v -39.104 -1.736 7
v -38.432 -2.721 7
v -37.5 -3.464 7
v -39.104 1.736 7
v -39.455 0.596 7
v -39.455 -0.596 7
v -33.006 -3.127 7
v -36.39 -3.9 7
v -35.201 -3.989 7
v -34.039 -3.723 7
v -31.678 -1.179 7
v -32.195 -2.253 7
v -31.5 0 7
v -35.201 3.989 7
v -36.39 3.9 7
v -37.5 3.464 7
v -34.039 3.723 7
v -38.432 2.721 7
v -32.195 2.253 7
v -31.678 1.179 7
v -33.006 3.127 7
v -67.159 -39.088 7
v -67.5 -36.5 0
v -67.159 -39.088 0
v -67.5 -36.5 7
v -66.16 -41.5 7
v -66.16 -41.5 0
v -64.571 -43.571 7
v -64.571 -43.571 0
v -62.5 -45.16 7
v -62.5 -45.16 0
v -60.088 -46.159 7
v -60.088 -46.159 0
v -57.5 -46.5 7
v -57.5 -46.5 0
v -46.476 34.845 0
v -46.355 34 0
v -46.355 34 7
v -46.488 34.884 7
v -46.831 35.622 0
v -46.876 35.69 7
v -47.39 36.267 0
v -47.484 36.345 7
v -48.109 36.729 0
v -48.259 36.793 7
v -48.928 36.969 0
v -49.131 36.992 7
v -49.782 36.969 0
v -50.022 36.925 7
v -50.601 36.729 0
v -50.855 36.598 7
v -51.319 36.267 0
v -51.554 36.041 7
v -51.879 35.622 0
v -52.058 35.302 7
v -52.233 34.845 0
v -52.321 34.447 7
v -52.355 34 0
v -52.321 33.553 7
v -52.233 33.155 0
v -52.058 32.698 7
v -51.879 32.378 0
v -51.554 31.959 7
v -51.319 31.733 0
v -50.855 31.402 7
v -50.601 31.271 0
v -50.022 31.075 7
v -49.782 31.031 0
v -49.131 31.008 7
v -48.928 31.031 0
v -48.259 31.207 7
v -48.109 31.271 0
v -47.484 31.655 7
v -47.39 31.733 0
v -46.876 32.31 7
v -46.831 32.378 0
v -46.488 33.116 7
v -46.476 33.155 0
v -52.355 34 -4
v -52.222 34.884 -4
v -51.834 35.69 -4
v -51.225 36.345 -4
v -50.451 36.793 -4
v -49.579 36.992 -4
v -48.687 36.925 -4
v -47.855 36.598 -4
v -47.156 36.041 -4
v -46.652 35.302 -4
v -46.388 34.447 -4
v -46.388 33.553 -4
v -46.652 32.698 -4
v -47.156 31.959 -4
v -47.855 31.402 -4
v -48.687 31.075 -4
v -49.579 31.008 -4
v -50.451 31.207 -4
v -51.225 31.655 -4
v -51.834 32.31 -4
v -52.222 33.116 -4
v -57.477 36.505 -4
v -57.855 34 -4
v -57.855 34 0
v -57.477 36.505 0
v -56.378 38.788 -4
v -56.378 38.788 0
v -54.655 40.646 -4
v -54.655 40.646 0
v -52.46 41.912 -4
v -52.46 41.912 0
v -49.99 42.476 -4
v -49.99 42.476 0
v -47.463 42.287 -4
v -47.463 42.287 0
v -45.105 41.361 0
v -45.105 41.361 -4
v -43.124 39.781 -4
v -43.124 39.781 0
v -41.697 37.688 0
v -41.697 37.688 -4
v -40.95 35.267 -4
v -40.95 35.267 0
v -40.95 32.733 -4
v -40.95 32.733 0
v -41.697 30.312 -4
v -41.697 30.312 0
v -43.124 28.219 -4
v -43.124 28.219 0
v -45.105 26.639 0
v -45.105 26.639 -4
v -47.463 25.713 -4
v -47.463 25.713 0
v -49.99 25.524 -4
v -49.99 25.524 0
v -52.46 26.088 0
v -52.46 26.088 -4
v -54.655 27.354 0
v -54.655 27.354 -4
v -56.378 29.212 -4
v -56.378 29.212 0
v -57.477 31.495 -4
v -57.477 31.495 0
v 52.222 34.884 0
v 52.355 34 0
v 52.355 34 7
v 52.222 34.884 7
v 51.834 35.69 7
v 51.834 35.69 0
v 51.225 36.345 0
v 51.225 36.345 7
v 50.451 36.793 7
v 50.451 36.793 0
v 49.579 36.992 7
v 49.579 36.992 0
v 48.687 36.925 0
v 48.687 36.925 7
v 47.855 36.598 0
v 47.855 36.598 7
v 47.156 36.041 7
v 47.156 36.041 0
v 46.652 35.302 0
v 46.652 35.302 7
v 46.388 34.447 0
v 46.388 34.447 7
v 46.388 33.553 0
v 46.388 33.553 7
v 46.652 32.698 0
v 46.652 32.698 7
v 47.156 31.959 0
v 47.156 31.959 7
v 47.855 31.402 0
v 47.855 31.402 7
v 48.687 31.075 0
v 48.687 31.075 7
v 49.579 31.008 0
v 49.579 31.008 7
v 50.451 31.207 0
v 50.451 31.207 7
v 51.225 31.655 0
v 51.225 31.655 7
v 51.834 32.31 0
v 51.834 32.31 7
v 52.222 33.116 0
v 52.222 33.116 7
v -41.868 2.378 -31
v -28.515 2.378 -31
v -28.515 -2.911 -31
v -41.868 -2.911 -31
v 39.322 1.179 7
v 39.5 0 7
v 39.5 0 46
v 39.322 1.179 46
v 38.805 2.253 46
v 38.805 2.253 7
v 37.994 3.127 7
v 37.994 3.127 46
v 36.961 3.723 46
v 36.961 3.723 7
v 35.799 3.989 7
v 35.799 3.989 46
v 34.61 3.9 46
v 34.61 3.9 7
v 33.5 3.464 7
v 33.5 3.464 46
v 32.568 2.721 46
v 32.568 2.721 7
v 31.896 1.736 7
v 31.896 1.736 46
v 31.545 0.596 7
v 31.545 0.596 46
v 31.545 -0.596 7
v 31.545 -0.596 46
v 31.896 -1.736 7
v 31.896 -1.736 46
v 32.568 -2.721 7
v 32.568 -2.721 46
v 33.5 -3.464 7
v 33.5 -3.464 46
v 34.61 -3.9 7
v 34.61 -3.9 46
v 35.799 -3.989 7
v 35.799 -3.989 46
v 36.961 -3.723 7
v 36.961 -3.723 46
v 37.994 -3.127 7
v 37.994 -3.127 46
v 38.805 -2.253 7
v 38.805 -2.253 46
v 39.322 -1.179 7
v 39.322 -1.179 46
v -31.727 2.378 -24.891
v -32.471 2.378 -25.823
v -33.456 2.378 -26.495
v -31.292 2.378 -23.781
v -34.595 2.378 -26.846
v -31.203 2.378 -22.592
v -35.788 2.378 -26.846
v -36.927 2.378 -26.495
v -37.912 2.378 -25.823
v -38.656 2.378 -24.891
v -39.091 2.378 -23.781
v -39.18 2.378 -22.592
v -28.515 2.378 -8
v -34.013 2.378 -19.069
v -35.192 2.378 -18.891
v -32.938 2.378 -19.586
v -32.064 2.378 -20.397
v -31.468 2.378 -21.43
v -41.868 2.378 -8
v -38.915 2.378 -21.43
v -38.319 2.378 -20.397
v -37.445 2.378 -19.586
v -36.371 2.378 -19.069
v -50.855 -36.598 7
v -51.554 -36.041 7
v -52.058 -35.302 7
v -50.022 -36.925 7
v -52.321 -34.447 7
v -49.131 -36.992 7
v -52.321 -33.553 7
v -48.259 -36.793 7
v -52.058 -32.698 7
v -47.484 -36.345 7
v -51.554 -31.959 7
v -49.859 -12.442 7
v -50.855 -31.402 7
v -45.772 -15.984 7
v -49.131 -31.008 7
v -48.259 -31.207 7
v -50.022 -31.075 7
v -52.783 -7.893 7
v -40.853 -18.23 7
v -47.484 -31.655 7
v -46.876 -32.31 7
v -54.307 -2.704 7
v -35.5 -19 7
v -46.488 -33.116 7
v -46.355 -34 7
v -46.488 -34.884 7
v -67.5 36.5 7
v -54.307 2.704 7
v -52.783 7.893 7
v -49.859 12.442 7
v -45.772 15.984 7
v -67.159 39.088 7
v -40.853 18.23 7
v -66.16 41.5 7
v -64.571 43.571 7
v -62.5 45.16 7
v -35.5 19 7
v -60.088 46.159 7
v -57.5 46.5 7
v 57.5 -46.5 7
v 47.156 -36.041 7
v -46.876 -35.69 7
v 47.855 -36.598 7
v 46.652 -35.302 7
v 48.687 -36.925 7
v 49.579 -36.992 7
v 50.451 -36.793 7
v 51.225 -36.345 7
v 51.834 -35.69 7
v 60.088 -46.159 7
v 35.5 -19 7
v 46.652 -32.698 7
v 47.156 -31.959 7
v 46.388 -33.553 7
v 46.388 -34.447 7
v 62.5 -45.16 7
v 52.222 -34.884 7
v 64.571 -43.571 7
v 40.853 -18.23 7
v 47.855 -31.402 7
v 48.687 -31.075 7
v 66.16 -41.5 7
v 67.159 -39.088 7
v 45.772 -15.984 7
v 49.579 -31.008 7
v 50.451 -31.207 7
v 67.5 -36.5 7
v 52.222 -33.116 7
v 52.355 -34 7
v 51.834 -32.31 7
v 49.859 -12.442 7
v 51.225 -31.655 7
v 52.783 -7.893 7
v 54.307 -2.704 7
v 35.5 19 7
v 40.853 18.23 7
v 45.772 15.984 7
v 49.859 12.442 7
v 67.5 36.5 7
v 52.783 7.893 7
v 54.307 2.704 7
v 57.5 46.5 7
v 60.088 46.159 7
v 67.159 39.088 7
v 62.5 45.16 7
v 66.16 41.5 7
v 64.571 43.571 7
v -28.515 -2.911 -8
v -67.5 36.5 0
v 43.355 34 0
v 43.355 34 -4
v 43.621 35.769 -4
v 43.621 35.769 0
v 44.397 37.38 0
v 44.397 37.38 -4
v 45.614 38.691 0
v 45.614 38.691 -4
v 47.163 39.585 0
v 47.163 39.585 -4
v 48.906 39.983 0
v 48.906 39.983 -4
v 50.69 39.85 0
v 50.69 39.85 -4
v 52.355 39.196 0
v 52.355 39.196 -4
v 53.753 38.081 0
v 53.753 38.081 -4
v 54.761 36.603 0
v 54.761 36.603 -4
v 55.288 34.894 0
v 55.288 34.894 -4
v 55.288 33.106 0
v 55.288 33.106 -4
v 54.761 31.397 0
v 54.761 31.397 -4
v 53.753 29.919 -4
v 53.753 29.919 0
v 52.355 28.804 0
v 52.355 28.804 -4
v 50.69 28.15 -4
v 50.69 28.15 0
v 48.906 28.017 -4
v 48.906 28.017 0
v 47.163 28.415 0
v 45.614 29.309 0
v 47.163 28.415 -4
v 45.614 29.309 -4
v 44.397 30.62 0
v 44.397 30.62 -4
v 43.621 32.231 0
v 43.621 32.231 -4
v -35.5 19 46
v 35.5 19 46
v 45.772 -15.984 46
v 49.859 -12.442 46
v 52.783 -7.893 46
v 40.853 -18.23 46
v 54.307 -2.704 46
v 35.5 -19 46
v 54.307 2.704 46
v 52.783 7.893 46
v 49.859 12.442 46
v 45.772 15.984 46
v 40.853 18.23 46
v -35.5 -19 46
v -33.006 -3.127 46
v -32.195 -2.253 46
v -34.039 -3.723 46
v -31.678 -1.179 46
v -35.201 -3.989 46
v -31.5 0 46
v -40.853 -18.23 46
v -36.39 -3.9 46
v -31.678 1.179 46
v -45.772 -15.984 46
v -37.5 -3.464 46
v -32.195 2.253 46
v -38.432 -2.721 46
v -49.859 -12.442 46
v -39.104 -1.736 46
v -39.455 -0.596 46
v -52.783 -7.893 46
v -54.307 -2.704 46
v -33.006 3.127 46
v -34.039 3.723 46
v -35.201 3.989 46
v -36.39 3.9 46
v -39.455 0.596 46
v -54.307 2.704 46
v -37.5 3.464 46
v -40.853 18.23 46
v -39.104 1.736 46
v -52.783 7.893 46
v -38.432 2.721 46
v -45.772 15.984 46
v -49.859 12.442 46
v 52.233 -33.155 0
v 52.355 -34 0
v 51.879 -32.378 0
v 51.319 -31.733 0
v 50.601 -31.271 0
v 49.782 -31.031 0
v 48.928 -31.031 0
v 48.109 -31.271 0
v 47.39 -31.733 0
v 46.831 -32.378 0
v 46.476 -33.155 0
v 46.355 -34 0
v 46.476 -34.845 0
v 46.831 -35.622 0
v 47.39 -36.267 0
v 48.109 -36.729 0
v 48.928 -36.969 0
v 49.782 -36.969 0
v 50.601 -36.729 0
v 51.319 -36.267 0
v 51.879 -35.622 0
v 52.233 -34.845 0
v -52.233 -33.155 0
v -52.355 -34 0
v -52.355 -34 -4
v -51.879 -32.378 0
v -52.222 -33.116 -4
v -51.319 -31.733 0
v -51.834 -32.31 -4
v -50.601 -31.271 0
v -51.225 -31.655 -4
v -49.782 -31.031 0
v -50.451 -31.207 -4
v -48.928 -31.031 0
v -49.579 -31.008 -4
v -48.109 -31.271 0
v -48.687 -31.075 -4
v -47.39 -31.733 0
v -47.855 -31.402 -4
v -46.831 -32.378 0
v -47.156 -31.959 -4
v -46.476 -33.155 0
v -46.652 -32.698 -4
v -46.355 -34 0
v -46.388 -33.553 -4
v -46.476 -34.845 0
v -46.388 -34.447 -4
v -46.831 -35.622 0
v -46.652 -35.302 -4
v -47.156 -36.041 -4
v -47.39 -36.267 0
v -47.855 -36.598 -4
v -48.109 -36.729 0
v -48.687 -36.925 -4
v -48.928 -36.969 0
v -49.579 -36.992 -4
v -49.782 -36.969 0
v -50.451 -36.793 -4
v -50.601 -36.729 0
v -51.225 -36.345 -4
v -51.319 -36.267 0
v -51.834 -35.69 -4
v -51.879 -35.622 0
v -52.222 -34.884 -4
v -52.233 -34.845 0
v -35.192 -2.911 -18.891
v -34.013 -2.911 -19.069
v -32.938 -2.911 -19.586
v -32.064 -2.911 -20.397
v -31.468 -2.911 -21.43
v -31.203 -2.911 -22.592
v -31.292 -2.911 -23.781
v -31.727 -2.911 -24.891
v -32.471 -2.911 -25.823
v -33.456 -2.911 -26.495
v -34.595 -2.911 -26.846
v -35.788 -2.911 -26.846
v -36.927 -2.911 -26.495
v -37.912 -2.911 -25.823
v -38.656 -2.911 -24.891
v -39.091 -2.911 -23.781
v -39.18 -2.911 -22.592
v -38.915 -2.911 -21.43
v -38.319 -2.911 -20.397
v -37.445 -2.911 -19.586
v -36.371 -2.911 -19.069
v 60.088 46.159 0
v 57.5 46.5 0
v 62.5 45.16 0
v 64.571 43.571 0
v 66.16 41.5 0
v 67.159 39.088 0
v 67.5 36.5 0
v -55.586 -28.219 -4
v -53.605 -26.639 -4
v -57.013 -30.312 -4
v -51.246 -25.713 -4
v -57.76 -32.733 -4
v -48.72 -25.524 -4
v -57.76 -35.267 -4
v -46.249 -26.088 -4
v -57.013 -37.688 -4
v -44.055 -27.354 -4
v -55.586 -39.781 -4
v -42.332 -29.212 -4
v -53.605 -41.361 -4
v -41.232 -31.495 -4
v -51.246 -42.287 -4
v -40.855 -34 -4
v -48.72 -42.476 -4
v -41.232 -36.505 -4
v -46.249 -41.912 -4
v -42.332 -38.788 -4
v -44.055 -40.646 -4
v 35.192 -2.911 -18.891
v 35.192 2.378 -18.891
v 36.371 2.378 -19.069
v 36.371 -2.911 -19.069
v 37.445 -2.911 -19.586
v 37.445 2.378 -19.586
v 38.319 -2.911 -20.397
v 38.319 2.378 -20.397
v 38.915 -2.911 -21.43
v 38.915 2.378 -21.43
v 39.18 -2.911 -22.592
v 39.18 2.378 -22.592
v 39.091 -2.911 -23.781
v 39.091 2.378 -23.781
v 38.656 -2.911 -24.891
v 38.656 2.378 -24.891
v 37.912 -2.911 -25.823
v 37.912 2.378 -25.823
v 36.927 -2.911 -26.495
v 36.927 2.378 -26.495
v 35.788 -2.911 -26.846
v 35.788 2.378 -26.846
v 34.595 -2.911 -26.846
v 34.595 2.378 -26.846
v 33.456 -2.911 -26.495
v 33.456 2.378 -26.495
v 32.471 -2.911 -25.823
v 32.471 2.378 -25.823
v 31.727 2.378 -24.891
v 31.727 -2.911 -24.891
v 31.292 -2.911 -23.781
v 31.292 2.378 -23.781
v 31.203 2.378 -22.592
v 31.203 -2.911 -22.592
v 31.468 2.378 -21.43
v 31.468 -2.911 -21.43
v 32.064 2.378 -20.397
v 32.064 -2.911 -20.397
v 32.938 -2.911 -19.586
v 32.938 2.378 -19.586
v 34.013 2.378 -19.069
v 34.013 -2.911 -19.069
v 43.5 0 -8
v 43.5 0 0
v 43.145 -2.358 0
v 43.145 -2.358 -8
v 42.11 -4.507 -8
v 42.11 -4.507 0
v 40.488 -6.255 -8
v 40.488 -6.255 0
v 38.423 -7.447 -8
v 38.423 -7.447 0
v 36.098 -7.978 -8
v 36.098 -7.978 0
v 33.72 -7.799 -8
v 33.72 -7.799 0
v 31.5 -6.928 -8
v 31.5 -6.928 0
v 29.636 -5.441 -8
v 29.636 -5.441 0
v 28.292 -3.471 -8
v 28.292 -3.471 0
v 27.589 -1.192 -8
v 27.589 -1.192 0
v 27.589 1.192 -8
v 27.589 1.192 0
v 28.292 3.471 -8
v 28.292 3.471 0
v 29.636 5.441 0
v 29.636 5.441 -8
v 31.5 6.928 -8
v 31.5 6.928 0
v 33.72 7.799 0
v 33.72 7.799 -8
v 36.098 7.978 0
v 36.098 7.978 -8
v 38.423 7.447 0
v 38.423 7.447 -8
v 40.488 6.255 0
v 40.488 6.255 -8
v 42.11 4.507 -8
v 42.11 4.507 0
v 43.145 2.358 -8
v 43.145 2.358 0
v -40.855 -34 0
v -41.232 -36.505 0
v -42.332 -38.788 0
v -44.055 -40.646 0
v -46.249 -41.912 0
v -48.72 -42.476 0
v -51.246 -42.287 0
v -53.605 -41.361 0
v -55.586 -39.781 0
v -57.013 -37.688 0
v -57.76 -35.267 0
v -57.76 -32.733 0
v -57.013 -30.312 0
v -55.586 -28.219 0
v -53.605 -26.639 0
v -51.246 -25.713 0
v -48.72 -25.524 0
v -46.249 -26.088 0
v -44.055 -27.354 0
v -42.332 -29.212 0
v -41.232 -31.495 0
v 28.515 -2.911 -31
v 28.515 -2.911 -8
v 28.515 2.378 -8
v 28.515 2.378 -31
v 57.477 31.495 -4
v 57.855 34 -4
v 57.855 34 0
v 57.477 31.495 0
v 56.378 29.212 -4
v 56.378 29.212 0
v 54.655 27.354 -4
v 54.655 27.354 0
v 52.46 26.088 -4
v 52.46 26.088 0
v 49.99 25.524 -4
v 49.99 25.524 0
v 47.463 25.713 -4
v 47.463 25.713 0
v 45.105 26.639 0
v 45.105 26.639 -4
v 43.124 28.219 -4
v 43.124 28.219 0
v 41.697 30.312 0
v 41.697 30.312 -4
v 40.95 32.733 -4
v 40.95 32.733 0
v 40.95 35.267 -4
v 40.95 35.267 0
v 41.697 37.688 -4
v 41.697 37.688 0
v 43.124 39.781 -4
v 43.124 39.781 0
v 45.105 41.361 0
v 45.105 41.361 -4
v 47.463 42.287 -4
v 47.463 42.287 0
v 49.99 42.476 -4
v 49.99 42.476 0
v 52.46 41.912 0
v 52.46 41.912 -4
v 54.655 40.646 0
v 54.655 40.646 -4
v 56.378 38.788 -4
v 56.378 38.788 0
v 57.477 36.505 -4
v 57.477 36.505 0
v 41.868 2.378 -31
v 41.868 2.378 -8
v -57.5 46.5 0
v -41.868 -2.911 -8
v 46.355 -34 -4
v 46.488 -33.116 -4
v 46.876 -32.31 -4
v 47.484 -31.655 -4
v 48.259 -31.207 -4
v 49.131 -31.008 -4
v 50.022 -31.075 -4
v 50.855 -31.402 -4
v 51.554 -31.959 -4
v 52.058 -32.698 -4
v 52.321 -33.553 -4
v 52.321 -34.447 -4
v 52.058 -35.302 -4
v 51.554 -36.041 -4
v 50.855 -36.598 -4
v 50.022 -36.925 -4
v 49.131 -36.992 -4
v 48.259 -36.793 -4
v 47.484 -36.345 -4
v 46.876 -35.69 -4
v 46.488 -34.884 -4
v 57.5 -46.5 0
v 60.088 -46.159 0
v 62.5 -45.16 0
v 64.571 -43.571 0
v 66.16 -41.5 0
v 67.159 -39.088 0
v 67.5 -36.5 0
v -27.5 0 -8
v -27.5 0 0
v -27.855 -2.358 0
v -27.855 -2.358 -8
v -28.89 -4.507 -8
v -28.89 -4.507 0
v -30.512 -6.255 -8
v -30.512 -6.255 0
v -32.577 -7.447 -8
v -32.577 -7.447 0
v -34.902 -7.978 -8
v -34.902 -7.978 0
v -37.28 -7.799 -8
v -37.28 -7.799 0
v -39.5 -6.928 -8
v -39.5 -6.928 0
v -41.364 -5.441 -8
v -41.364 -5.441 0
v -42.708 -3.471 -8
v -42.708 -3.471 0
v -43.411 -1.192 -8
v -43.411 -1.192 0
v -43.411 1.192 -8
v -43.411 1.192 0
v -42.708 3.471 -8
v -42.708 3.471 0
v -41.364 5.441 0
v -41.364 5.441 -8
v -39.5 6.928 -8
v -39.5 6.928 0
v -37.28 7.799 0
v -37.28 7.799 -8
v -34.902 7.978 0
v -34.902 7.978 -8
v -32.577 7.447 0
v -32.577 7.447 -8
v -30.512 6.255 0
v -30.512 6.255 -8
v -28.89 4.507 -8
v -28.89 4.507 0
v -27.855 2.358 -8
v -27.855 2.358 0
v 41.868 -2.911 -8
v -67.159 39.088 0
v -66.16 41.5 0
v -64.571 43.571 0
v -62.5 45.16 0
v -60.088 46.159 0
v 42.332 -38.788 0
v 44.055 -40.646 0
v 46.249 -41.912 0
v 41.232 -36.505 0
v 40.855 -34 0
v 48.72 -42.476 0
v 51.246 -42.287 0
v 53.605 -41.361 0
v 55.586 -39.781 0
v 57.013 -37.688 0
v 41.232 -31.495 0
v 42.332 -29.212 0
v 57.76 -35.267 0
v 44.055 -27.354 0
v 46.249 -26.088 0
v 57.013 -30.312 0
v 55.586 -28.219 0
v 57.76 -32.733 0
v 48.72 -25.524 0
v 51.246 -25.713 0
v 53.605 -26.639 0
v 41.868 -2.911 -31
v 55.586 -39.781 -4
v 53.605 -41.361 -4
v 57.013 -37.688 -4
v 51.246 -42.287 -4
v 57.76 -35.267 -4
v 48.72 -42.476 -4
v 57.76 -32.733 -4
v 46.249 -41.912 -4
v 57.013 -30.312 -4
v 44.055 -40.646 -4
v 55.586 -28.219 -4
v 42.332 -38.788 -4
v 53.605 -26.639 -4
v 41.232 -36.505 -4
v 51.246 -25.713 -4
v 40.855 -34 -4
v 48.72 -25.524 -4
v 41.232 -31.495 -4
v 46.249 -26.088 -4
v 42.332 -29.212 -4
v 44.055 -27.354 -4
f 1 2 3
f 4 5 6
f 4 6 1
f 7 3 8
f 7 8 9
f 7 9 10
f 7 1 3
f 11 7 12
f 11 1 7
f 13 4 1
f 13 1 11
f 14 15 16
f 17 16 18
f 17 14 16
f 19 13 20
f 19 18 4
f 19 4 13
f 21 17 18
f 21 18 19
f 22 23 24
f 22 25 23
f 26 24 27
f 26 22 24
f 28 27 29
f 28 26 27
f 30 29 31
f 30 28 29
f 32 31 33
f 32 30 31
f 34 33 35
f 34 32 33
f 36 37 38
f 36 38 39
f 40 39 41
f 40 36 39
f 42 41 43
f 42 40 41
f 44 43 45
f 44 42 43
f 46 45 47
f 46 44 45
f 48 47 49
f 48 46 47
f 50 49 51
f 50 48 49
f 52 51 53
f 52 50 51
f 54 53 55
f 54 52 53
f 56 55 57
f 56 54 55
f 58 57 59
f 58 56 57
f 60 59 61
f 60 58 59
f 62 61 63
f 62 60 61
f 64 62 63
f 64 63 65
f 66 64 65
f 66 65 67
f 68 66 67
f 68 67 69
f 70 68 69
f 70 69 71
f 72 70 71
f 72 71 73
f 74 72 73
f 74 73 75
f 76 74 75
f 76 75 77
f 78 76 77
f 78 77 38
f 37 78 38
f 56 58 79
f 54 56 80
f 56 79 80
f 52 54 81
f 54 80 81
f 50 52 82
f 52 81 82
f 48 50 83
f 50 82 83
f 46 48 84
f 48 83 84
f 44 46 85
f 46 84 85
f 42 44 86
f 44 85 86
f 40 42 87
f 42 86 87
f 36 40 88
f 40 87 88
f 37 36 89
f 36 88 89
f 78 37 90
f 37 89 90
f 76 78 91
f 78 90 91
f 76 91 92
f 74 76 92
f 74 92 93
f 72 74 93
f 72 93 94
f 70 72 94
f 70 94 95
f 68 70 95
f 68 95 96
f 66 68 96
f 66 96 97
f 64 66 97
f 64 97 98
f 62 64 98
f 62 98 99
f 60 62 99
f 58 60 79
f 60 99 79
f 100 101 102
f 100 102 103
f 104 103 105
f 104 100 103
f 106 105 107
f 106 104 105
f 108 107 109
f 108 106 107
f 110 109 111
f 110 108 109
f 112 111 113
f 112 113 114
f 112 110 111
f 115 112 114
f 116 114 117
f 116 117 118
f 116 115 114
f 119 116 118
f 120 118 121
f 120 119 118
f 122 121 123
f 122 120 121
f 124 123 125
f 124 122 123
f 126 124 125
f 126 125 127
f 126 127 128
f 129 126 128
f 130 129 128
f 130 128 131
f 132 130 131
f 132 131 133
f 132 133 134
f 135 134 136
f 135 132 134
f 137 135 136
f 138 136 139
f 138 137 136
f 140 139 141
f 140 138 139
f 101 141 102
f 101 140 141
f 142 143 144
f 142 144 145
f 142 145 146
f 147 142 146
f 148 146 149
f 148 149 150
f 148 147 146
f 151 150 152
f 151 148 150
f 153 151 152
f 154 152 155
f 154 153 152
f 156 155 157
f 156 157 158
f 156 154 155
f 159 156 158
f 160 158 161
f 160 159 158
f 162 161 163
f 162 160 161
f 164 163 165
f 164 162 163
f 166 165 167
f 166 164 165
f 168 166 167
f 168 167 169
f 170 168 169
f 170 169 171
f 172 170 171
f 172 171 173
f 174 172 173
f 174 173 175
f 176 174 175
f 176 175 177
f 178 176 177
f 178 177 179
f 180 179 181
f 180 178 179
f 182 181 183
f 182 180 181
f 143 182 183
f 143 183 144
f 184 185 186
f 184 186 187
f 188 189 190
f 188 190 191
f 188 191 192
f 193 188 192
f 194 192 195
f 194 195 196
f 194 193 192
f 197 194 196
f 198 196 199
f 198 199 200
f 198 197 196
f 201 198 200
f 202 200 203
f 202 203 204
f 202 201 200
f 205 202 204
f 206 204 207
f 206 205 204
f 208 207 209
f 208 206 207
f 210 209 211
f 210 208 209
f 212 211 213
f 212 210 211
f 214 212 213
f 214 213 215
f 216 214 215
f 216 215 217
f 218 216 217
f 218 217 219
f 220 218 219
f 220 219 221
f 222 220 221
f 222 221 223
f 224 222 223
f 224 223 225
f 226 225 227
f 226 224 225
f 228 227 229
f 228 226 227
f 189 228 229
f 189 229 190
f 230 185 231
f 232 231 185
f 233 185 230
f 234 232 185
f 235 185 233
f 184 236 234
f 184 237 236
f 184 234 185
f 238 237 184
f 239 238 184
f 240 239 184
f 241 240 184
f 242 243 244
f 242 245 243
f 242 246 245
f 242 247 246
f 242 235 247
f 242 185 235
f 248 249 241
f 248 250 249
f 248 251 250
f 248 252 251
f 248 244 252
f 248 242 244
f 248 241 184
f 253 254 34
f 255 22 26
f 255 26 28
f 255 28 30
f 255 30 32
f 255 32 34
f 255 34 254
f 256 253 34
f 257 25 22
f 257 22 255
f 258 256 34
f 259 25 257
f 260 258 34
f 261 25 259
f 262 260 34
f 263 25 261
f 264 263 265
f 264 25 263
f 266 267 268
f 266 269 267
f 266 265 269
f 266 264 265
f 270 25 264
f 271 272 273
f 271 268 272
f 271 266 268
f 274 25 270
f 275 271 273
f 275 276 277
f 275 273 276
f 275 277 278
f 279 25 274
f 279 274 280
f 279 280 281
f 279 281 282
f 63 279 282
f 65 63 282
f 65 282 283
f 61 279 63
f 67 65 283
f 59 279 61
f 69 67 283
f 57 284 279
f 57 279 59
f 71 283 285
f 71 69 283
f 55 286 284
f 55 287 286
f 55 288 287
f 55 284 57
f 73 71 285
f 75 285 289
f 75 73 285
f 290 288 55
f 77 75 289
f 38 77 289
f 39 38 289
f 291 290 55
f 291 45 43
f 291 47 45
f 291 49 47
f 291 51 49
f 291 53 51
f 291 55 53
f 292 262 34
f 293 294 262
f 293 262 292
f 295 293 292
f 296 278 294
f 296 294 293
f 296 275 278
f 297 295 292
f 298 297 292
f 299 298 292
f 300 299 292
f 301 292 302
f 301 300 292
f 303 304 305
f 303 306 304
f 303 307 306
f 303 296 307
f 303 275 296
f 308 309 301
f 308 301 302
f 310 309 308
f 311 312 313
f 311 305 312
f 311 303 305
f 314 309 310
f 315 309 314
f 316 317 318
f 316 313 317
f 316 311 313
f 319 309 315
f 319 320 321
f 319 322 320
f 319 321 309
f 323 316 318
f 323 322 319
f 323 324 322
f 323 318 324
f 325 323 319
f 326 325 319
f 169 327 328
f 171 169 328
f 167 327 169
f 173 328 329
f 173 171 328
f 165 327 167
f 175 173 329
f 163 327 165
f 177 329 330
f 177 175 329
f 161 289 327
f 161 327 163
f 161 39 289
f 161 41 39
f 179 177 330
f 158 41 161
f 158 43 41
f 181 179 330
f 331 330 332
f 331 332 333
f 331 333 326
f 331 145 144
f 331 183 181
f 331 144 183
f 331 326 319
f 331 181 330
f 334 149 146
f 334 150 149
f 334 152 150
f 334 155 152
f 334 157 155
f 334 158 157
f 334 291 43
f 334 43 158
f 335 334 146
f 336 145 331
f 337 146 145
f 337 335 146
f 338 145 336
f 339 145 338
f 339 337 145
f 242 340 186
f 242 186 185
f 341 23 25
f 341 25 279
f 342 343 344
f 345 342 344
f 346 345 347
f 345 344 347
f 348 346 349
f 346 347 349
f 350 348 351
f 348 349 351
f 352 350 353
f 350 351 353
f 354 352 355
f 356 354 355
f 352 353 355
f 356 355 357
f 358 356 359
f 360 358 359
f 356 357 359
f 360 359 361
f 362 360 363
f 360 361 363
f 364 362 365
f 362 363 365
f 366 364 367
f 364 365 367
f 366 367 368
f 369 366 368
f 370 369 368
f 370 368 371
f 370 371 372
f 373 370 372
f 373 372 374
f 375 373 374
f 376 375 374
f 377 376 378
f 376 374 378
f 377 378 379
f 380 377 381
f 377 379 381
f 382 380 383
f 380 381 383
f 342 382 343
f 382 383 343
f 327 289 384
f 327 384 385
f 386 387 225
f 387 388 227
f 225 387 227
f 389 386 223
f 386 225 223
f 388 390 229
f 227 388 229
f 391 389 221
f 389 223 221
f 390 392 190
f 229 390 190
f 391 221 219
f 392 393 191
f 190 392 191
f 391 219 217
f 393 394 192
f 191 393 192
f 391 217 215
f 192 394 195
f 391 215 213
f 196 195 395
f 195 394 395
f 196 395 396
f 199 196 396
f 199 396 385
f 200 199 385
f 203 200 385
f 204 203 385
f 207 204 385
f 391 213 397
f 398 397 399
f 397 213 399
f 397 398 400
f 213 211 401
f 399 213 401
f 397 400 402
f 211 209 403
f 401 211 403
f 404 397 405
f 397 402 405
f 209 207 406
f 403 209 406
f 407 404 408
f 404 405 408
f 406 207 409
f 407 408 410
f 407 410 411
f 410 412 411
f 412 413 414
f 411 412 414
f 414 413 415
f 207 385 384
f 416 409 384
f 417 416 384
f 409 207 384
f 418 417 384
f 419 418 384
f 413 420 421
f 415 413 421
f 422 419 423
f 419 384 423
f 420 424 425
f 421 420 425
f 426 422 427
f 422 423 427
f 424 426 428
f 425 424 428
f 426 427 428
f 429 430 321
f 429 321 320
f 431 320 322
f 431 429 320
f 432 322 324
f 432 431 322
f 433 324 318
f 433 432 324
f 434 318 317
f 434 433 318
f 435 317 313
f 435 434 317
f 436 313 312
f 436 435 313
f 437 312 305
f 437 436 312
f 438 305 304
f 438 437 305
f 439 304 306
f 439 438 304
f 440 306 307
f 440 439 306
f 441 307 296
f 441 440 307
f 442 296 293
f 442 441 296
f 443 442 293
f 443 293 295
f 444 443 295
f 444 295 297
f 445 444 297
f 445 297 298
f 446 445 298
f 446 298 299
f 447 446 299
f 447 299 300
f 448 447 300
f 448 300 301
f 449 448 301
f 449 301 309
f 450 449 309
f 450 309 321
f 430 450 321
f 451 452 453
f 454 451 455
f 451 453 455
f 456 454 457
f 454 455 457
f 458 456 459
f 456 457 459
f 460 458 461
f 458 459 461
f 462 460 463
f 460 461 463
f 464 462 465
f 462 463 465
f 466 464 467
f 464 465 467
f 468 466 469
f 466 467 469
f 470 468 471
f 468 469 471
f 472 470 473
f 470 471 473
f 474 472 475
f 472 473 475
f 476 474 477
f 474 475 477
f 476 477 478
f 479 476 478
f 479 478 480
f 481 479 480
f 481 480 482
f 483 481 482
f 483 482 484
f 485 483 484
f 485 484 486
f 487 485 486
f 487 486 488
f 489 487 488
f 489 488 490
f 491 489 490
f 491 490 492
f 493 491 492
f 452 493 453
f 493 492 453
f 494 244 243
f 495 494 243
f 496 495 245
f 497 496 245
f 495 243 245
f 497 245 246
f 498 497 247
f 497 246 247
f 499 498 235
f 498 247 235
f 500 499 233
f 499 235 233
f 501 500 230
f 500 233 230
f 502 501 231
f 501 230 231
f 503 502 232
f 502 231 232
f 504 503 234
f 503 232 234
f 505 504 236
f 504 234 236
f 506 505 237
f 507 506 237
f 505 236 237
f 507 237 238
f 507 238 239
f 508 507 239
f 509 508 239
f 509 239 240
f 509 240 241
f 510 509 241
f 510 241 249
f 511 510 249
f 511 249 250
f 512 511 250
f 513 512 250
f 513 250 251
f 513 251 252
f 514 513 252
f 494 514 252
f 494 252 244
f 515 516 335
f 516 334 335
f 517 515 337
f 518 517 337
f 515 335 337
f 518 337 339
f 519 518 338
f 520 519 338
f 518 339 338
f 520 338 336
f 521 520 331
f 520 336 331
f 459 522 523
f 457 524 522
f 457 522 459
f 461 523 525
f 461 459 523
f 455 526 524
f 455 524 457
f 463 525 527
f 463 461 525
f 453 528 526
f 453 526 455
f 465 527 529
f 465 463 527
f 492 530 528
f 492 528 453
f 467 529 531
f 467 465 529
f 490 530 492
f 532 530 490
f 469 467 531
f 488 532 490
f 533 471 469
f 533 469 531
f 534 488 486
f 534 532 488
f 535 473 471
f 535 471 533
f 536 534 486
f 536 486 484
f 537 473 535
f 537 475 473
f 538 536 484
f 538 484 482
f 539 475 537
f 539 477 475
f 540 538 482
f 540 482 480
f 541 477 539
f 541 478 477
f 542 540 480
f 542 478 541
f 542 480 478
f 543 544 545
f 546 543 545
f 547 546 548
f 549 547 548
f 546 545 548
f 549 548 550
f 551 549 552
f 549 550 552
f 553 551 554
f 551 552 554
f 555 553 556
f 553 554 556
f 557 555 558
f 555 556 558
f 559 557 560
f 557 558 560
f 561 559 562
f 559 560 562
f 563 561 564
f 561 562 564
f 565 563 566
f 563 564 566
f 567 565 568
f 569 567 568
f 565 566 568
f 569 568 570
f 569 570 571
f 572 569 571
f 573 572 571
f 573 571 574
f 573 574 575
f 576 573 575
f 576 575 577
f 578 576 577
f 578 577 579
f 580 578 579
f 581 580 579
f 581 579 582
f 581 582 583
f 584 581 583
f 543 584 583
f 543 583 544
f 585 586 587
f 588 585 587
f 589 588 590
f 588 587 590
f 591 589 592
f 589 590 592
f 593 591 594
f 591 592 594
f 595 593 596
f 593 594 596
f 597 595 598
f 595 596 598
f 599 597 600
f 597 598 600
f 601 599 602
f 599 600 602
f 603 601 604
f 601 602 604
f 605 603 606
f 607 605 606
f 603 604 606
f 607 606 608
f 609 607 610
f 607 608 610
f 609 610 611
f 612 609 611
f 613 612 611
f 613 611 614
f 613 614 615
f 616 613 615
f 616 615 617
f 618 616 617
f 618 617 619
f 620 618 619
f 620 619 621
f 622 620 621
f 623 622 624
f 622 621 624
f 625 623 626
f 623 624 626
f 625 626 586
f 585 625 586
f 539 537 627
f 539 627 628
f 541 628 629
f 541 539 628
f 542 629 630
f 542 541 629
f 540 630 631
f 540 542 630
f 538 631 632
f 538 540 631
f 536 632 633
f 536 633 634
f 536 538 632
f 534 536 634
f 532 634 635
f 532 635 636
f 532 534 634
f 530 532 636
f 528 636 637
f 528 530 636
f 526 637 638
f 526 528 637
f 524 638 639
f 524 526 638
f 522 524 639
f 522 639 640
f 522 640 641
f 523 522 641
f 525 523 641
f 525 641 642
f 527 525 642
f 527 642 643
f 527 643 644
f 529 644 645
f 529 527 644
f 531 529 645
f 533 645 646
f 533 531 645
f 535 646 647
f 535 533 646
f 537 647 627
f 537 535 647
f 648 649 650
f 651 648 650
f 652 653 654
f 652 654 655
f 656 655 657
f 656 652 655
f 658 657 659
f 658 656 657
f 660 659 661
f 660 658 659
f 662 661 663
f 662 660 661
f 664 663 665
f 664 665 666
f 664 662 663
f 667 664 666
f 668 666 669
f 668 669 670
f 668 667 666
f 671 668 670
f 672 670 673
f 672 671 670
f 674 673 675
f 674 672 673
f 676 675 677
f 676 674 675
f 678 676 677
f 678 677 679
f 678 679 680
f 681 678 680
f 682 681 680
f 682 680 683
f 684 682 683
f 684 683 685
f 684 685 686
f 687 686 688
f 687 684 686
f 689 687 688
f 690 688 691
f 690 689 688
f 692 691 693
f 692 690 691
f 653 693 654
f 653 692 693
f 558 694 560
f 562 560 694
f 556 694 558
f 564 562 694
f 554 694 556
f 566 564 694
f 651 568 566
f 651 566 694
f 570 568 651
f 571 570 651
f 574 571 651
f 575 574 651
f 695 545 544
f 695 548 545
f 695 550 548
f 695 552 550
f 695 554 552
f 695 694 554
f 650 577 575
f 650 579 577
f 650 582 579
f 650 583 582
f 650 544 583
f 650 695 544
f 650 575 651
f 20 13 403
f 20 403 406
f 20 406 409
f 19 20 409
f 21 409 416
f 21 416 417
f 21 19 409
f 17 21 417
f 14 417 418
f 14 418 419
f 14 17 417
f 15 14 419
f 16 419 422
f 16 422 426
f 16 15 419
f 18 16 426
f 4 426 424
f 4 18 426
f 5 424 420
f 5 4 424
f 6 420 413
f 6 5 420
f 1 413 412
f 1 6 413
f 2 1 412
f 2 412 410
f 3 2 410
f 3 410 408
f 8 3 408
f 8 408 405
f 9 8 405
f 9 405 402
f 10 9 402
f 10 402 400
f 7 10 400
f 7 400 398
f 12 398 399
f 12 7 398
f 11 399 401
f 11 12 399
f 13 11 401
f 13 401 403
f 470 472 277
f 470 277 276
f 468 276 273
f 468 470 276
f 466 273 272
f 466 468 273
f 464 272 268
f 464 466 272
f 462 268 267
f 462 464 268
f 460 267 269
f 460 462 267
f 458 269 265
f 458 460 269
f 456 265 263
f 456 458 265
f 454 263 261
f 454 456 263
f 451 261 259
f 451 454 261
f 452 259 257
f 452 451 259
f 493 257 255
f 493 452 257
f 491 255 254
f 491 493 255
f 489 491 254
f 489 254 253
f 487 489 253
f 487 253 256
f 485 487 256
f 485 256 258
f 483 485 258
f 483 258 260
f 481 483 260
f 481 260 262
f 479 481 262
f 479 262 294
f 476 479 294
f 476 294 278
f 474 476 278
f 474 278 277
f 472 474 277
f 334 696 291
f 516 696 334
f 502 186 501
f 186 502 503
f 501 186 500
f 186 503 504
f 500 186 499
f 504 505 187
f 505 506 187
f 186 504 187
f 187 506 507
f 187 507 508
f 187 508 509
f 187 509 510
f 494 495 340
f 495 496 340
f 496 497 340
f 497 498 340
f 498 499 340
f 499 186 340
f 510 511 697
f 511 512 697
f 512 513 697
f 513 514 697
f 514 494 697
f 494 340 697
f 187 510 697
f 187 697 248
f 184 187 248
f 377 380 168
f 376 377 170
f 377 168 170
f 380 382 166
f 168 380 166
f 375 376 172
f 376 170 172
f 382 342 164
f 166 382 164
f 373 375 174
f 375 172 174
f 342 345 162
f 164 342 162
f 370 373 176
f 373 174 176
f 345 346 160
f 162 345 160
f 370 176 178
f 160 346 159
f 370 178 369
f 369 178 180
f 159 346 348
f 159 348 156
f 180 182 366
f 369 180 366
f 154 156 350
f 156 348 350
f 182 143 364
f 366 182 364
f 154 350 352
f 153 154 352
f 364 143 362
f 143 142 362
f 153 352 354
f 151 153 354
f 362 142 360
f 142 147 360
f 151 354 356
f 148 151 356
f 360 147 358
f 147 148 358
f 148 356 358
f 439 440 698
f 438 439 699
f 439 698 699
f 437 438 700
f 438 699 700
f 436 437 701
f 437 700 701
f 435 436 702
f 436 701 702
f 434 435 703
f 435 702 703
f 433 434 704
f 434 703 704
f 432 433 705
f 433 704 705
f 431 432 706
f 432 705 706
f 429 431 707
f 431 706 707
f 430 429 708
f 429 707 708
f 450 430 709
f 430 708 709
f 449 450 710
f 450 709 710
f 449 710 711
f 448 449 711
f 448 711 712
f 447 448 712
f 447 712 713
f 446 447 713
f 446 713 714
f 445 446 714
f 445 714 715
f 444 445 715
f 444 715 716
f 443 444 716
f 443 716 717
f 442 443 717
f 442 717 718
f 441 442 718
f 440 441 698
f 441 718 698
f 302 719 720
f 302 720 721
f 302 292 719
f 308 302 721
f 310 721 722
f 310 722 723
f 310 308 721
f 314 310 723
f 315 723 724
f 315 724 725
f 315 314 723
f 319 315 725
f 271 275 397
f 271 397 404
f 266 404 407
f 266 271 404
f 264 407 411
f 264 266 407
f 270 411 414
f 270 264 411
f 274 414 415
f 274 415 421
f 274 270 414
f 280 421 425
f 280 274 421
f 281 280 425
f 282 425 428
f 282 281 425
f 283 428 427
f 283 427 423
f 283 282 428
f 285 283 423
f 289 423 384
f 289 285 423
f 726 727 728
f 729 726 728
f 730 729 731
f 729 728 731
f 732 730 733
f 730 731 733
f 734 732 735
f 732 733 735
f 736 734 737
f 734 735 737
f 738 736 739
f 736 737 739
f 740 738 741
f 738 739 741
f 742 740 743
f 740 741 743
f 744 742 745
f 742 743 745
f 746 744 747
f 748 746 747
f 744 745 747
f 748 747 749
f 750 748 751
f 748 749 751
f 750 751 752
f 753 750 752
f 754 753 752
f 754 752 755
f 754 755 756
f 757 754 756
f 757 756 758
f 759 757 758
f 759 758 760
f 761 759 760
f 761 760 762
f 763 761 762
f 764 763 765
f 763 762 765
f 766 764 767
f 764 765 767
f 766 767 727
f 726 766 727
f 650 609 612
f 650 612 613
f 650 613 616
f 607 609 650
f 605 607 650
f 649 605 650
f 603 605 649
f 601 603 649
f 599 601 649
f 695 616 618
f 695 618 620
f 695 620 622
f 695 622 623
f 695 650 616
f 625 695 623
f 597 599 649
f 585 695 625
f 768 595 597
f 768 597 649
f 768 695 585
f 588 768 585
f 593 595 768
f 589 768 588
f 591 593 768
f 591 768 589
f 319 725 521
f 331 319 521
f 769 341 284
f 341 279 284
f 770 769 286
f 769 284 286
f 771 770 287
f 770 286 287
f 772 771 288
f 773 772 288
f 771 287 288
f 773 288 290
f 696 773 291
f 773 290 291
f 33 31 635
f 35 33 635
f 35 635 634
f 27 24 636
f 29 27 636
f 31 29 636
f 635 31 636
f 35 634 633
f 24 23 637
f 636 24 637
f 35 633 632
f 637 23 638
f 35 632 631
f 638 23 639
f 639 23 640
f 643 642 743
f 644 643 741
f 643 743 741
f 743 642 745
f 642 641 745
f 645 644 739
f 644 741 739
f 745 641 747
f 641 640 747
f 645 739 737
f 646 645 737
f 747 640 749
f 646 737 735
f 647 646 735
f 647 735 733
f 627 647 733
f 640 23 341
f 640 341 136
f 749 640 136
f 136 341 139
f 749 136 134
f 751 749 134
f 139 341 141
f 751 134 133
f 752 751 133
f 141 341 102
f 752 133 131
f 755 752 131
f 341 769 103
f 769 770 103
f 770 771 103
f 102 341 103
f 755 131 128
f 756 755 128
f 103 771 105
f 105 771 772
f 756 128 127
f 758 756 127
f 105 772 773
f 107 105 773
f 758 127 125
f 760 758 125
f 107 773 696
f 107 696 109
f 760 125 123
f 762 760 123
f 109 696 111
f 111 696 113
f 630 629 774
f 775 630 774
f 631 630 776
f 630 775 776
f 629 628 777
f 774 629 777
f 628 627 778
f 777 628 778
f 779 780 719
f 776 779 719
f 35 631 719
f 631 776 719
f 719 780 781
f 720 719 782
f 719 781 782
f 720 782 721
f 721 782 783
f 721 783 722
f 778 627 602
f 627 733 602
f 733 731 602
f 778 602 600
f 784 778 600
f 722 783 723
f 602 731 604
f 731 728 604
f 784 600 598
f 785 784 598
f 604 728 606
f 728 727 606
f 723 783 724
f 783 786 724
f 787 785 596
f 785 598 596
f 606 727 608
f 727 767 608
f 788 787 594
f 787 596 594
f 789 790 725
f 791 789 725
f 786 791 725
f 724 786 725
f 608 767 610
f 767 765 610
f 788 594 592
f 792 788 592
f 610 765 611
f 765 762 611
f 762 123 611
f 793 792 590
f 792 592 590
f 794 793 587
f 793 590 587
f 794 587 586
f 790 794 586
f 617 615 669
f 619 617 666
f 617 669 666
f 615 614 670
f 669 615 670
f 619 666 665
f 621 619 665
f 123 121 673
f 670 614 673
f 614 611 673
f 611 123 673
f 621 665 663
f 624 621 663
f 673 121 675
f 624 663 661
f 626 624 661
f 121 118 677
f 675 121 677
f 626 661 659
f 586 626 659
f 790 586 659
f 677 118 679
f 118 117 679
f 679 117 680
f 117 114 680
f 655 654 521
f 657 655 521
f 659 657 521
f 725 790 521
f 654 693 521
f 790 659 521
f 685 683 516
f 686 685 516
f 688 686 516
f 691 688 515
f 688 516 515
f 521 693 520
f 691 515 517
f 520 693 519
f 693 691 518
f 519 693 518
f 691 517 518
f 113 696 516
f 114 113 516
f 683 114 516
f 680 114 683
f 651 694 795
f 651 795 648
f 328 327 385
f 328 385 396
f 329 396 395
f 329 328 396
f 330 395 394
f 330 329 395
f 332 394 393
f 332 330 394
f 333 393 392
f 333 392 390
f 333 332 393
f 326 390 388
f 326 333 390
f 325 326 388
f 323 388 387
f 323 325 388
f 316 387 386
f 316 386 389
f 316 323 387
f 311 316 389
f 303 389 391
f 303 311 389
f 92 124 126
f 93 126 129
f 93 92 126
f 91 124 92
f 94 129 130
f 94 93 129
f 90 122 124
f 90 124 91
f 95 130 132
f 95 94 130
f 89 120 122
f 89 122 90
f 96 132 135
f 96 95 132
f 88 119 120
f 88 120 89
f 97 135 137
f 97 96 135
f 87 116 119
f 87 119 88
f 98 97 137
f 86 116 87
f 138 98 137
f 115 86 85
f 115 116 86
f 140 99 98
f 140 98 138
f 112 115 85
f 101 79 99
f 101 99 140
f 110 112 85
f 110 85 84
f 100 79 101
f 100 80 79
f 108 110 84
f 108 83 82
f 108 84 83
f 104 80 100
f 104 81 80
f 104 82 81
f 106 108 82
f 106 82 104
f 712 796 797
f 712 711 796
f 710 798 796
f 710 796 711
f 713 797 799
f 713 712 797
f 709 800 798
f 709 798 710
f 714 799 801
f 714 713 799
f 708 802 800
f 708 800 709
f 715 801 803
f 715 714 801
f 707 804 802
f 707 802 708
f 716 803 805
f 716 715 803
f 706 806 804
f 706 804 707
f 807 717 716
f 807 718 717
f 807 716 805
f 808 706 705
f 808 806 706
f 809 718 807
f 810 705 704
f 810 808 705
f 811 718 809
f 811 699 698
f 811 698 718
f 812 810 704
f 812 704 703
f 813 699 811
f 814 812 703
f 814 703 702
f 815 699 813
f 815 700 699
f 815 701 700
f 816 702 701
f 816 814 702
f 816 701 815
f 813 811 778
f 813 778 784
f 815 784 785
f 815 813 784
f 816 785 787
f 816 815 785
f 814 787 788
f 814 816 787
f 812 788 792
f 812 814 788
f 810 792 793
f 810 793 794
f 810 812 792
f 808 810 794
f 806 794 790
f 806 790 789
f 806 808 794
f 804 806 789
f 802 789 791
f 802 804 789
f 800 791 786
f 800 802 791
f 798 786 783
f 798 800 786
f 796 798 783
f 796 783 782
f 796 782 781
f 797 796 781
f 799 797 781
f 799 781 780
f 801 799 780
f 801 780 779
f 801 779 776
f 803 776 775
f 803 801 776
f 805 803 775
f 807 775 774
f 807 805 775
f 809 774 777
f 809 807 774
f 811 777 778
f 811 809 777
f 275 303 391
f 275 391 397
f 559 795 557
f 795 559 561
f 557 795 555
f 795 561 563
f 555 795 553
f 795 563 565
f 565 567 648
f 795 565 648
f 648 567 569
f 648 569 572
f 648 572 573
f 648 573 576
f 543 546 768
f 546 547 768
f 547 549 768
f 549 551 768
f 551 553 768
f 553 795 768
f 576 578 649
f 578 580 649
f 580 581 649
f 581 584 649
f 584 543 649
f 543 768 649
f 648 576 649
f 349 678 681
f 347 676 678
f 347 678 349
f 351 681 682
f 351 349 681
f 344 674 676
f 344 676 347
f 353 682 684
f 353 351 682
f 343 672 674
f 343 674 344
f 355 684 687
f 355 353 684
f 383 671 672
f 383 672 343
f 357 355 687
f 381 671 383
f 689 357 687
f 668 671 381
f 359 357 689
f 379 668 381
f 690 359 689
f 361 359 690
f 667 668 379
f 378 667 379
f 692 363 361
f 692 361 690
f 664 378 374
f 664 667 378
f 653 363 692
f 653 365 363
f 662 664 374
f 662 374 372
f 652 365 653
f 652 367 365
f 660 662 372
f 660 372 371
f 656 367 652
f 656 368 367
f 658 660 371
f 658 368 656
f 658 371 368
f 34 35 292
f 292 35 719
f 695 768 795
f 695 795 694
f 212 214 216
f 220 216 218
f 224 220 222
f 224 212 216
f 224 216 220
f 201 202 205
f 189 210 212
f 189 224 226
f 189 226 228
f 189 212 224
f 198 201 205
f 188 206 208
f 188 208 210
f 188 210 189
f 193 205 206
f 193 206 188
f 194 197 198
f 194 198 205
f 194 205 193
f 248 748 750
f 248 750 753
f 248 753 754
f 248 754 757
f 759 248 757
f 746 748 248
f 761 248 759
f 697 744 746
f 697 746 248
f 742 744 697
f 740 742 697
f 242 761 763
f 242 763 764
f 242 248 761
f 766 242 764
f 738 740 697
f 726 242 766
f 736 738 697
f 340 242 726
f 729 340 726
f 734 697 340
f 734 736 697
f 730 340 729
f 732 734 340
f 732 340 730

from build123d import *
from build123d.topology import SkipClean

# Parameters (mm, degrees)
SKETCH1_W           = 135
SKETCH1_H           = 93
SKETCH1_R           = 3
BOSS_EXTRUDE1_DEPTH = 7
SKETCH2_R           = 4
BOSS_EXTRUDE2_DEPTH = 39
FILLET1_R           = 10
SKETCH3_R           = 8
BOSS_EXTRUDE3_DEPTH = 8
SKETCH4_W           = 13.352525021
SKETCH4_H           = 5.289406047
BOSS_EXTRUDE4_DEPTH = 23
SKETCH5_R           = 4
CUT_EXTRUDE1_DEPTH  = 23
BOSS_EXTRUDE5_START = 4
SKETCH6_R           = 8.5
SKETCH6_R_2         = 6
SKETCH6_R_3         = 3
BOSS_EXTRUDE5_DEPTH = 4


with BuildPart() as part:
    # Sketch1 → Boss-Extrude1 (new body)
    with BuildSketch(Plane.XY):
        Rectangle(SKETCH1_W, SKETCH1_H)
        with Locations((-49.35483871, 34)):
            Circle(SKETCH1_R, mode=Mode.SUBTRACT)
        with Locations((49.35483871, 34)):
            Circle(SKETCH1_R, mode=Mode.SUBTRACT)
        with Locations((-49.35483871, -34)):
            Circle(SKETCH1_R, mode=Mode.SUBTRACT)
        with Locations((49.35483871, -34)):
            Circle(SKETCH1_R, mode=Mode.SUBTRACT)
    extrude(amount=BOSS_EXTRUDE1_DEPTH)

    # Sketch2 → Boss-Extrude2 (add)
    with BuildSketch(Plane.XY.offset(7)):
        with BuildLine():
            Line((-35.5, 19), (35.5, 19))
            ThreePointArc((35.5, 19), (54.5, 0), (35.5, -19))
            Line((35.5, -19), (-35.5, -19))
            ThreePointArc((-35.5, -19), (-54.5, 0), (-35.5, 19))
        make_face()
        with Locations((-35.5, 0)):
            Circle(SKETCH2_R, mode=Mode.SUBTRACT)
        with Locations((35.5, 0)):
            Circle(SKETCH2_R, mode=Mode.SUBTRACT)
    extrude(amount=BOSS_EXTRUDE2_DEPTH)

    # Fillet1
    fillet1_edges = [part.edges().sort_by_distance(p)[0] for p in [
        (-67.5, -46.5, 3.5),
        (-67.5, 46.5, 3.5),
        (67.5, 46.5, 3.5),
        (67.5, -46.5, 3.5),
    ]]
    fillet(fillet1_edges, radius=FILLET1_R)

    # Sketch3 → Boss-Extrude3 (add)
    with BuildSketch(Plane(origin=(0, 0, 0), x_dir=(-1, 0, 0), z_dir=(0, 0, -1))):
        with Locations(Location((-35.5, 0, 0), (0, 0, 180))):
            Circle(SKETCH3_R)
        with Locations(Location((35.5, 0, 0), (0, 0, 180))):
            Circle(SKETCH3_R)
    extrude(amount=BOSS_EXTRUDE3_DEPTH)

    # Sketch4 → Boss-Extrude4 (add)
    with BuildSketch(Plane(origin=(0, 0, -8), x_dir=(-1, 0, 0), z_dir=(0, 0, -1))):
        with Locations((-35.191522183, -0.266454552)):
            Rectangle(SKETCH4_W, SKETCH4_H)
        with Locations((35.191522183, -0.266454552)):
            Rectangle(SKETCH4_W, SKETCH4_H)
    extrude(amount=BOSS_EXTRUDE4_DEPTH)

    # Sketch5 → Cut-Extrude1 (cut)
    with BuildSketch(Plane(origin=(0, 2.378248472, 0), x_dir=(1, 0, 0), z_dir=(0, 1, 0))):
        with Locations(Location((35.191522184, 22.89088314, 0), (0, 0, 270))):
            Circle(SKETCH5_R)
        with Locations(Location((-35.191522184, 22.89088314, 0), (0, 0, 270))):
            Circle(SKETCH5_R)
    extrude(amount=-CUT_EXTRUDE1_DEPTH, mode=Mode.SUBTRACT)

    # Sketch6 → Boss-Extrude5 (add)
    # profile 1 of 4: a face of its own
    with SkipClean():  # the faces are left unmerged after this step: merging them gives an invalid solid
        with BuildSketch(Plane(origin=(0, 0, 0), x_dir=(-1, 0, 0), z_dir=(0, 0, -1)).offset(BOSS_EXTRUDE5_START)):
            with Locations(Location((-49.35483871, 34, 0), (0, 0, 180))):
                Circle(SKETCH6_R)
            with Locations((-49.35483871, 34)):
                Circle(SKETCH6_R_2, mode=Mode.SUBTRACT)
        # profile 2 of 4: a face of its own
        with BuildSketch(Plane(origin=(0, 0, 0), x_dir=(-1, 0, 0), z_dir=(0, 0, -1)).offset(BOSS_EXTRUDE5_START)):
            with Locations((-49.35483871, -34)):
                Circle(SKETCH6_R)
            with Locations((-49.35483871, -34)):
                Circle(SKETCH6_R_3, mode=Mode.SUBTRACT)
        # profile 3 of 4: a face of its own
        with BuildSketch(Plane(origin=(0, 0, 0), x_dir=(-1, 0, 0), z_dir=(0, 0, -1)).offset(BOSS_EXTRUDE5_START)):
            with Locations(Location((49.35483871, -34, 0), (0, 0, 180))):
                Circle(SKETCH6_R)
            with Locations((49.35483871, -34)):
                Circle(SKETCH6_R_3, mode=Mode.SUBTRACT)
        # profile 4 of 4: a face of its own
        with BuildSketch(Plane(origin=(0, 0, 0), x_dir=(-1, 0, 0), z_dir=(0, 0, -1)).offset(BOSS_EXTRUDE5_START)):
            with Locations((49.35483871, 34)):
                Circle(SKETCH6_R)
            with Locations((49.35483871, 34)):
                Circle(SKETCH6_R_3, mode=Mode.SUBTRACT)
        extrude(amount=-BOSS_EXTRUDE5_DEPTH)


solid = part.part
